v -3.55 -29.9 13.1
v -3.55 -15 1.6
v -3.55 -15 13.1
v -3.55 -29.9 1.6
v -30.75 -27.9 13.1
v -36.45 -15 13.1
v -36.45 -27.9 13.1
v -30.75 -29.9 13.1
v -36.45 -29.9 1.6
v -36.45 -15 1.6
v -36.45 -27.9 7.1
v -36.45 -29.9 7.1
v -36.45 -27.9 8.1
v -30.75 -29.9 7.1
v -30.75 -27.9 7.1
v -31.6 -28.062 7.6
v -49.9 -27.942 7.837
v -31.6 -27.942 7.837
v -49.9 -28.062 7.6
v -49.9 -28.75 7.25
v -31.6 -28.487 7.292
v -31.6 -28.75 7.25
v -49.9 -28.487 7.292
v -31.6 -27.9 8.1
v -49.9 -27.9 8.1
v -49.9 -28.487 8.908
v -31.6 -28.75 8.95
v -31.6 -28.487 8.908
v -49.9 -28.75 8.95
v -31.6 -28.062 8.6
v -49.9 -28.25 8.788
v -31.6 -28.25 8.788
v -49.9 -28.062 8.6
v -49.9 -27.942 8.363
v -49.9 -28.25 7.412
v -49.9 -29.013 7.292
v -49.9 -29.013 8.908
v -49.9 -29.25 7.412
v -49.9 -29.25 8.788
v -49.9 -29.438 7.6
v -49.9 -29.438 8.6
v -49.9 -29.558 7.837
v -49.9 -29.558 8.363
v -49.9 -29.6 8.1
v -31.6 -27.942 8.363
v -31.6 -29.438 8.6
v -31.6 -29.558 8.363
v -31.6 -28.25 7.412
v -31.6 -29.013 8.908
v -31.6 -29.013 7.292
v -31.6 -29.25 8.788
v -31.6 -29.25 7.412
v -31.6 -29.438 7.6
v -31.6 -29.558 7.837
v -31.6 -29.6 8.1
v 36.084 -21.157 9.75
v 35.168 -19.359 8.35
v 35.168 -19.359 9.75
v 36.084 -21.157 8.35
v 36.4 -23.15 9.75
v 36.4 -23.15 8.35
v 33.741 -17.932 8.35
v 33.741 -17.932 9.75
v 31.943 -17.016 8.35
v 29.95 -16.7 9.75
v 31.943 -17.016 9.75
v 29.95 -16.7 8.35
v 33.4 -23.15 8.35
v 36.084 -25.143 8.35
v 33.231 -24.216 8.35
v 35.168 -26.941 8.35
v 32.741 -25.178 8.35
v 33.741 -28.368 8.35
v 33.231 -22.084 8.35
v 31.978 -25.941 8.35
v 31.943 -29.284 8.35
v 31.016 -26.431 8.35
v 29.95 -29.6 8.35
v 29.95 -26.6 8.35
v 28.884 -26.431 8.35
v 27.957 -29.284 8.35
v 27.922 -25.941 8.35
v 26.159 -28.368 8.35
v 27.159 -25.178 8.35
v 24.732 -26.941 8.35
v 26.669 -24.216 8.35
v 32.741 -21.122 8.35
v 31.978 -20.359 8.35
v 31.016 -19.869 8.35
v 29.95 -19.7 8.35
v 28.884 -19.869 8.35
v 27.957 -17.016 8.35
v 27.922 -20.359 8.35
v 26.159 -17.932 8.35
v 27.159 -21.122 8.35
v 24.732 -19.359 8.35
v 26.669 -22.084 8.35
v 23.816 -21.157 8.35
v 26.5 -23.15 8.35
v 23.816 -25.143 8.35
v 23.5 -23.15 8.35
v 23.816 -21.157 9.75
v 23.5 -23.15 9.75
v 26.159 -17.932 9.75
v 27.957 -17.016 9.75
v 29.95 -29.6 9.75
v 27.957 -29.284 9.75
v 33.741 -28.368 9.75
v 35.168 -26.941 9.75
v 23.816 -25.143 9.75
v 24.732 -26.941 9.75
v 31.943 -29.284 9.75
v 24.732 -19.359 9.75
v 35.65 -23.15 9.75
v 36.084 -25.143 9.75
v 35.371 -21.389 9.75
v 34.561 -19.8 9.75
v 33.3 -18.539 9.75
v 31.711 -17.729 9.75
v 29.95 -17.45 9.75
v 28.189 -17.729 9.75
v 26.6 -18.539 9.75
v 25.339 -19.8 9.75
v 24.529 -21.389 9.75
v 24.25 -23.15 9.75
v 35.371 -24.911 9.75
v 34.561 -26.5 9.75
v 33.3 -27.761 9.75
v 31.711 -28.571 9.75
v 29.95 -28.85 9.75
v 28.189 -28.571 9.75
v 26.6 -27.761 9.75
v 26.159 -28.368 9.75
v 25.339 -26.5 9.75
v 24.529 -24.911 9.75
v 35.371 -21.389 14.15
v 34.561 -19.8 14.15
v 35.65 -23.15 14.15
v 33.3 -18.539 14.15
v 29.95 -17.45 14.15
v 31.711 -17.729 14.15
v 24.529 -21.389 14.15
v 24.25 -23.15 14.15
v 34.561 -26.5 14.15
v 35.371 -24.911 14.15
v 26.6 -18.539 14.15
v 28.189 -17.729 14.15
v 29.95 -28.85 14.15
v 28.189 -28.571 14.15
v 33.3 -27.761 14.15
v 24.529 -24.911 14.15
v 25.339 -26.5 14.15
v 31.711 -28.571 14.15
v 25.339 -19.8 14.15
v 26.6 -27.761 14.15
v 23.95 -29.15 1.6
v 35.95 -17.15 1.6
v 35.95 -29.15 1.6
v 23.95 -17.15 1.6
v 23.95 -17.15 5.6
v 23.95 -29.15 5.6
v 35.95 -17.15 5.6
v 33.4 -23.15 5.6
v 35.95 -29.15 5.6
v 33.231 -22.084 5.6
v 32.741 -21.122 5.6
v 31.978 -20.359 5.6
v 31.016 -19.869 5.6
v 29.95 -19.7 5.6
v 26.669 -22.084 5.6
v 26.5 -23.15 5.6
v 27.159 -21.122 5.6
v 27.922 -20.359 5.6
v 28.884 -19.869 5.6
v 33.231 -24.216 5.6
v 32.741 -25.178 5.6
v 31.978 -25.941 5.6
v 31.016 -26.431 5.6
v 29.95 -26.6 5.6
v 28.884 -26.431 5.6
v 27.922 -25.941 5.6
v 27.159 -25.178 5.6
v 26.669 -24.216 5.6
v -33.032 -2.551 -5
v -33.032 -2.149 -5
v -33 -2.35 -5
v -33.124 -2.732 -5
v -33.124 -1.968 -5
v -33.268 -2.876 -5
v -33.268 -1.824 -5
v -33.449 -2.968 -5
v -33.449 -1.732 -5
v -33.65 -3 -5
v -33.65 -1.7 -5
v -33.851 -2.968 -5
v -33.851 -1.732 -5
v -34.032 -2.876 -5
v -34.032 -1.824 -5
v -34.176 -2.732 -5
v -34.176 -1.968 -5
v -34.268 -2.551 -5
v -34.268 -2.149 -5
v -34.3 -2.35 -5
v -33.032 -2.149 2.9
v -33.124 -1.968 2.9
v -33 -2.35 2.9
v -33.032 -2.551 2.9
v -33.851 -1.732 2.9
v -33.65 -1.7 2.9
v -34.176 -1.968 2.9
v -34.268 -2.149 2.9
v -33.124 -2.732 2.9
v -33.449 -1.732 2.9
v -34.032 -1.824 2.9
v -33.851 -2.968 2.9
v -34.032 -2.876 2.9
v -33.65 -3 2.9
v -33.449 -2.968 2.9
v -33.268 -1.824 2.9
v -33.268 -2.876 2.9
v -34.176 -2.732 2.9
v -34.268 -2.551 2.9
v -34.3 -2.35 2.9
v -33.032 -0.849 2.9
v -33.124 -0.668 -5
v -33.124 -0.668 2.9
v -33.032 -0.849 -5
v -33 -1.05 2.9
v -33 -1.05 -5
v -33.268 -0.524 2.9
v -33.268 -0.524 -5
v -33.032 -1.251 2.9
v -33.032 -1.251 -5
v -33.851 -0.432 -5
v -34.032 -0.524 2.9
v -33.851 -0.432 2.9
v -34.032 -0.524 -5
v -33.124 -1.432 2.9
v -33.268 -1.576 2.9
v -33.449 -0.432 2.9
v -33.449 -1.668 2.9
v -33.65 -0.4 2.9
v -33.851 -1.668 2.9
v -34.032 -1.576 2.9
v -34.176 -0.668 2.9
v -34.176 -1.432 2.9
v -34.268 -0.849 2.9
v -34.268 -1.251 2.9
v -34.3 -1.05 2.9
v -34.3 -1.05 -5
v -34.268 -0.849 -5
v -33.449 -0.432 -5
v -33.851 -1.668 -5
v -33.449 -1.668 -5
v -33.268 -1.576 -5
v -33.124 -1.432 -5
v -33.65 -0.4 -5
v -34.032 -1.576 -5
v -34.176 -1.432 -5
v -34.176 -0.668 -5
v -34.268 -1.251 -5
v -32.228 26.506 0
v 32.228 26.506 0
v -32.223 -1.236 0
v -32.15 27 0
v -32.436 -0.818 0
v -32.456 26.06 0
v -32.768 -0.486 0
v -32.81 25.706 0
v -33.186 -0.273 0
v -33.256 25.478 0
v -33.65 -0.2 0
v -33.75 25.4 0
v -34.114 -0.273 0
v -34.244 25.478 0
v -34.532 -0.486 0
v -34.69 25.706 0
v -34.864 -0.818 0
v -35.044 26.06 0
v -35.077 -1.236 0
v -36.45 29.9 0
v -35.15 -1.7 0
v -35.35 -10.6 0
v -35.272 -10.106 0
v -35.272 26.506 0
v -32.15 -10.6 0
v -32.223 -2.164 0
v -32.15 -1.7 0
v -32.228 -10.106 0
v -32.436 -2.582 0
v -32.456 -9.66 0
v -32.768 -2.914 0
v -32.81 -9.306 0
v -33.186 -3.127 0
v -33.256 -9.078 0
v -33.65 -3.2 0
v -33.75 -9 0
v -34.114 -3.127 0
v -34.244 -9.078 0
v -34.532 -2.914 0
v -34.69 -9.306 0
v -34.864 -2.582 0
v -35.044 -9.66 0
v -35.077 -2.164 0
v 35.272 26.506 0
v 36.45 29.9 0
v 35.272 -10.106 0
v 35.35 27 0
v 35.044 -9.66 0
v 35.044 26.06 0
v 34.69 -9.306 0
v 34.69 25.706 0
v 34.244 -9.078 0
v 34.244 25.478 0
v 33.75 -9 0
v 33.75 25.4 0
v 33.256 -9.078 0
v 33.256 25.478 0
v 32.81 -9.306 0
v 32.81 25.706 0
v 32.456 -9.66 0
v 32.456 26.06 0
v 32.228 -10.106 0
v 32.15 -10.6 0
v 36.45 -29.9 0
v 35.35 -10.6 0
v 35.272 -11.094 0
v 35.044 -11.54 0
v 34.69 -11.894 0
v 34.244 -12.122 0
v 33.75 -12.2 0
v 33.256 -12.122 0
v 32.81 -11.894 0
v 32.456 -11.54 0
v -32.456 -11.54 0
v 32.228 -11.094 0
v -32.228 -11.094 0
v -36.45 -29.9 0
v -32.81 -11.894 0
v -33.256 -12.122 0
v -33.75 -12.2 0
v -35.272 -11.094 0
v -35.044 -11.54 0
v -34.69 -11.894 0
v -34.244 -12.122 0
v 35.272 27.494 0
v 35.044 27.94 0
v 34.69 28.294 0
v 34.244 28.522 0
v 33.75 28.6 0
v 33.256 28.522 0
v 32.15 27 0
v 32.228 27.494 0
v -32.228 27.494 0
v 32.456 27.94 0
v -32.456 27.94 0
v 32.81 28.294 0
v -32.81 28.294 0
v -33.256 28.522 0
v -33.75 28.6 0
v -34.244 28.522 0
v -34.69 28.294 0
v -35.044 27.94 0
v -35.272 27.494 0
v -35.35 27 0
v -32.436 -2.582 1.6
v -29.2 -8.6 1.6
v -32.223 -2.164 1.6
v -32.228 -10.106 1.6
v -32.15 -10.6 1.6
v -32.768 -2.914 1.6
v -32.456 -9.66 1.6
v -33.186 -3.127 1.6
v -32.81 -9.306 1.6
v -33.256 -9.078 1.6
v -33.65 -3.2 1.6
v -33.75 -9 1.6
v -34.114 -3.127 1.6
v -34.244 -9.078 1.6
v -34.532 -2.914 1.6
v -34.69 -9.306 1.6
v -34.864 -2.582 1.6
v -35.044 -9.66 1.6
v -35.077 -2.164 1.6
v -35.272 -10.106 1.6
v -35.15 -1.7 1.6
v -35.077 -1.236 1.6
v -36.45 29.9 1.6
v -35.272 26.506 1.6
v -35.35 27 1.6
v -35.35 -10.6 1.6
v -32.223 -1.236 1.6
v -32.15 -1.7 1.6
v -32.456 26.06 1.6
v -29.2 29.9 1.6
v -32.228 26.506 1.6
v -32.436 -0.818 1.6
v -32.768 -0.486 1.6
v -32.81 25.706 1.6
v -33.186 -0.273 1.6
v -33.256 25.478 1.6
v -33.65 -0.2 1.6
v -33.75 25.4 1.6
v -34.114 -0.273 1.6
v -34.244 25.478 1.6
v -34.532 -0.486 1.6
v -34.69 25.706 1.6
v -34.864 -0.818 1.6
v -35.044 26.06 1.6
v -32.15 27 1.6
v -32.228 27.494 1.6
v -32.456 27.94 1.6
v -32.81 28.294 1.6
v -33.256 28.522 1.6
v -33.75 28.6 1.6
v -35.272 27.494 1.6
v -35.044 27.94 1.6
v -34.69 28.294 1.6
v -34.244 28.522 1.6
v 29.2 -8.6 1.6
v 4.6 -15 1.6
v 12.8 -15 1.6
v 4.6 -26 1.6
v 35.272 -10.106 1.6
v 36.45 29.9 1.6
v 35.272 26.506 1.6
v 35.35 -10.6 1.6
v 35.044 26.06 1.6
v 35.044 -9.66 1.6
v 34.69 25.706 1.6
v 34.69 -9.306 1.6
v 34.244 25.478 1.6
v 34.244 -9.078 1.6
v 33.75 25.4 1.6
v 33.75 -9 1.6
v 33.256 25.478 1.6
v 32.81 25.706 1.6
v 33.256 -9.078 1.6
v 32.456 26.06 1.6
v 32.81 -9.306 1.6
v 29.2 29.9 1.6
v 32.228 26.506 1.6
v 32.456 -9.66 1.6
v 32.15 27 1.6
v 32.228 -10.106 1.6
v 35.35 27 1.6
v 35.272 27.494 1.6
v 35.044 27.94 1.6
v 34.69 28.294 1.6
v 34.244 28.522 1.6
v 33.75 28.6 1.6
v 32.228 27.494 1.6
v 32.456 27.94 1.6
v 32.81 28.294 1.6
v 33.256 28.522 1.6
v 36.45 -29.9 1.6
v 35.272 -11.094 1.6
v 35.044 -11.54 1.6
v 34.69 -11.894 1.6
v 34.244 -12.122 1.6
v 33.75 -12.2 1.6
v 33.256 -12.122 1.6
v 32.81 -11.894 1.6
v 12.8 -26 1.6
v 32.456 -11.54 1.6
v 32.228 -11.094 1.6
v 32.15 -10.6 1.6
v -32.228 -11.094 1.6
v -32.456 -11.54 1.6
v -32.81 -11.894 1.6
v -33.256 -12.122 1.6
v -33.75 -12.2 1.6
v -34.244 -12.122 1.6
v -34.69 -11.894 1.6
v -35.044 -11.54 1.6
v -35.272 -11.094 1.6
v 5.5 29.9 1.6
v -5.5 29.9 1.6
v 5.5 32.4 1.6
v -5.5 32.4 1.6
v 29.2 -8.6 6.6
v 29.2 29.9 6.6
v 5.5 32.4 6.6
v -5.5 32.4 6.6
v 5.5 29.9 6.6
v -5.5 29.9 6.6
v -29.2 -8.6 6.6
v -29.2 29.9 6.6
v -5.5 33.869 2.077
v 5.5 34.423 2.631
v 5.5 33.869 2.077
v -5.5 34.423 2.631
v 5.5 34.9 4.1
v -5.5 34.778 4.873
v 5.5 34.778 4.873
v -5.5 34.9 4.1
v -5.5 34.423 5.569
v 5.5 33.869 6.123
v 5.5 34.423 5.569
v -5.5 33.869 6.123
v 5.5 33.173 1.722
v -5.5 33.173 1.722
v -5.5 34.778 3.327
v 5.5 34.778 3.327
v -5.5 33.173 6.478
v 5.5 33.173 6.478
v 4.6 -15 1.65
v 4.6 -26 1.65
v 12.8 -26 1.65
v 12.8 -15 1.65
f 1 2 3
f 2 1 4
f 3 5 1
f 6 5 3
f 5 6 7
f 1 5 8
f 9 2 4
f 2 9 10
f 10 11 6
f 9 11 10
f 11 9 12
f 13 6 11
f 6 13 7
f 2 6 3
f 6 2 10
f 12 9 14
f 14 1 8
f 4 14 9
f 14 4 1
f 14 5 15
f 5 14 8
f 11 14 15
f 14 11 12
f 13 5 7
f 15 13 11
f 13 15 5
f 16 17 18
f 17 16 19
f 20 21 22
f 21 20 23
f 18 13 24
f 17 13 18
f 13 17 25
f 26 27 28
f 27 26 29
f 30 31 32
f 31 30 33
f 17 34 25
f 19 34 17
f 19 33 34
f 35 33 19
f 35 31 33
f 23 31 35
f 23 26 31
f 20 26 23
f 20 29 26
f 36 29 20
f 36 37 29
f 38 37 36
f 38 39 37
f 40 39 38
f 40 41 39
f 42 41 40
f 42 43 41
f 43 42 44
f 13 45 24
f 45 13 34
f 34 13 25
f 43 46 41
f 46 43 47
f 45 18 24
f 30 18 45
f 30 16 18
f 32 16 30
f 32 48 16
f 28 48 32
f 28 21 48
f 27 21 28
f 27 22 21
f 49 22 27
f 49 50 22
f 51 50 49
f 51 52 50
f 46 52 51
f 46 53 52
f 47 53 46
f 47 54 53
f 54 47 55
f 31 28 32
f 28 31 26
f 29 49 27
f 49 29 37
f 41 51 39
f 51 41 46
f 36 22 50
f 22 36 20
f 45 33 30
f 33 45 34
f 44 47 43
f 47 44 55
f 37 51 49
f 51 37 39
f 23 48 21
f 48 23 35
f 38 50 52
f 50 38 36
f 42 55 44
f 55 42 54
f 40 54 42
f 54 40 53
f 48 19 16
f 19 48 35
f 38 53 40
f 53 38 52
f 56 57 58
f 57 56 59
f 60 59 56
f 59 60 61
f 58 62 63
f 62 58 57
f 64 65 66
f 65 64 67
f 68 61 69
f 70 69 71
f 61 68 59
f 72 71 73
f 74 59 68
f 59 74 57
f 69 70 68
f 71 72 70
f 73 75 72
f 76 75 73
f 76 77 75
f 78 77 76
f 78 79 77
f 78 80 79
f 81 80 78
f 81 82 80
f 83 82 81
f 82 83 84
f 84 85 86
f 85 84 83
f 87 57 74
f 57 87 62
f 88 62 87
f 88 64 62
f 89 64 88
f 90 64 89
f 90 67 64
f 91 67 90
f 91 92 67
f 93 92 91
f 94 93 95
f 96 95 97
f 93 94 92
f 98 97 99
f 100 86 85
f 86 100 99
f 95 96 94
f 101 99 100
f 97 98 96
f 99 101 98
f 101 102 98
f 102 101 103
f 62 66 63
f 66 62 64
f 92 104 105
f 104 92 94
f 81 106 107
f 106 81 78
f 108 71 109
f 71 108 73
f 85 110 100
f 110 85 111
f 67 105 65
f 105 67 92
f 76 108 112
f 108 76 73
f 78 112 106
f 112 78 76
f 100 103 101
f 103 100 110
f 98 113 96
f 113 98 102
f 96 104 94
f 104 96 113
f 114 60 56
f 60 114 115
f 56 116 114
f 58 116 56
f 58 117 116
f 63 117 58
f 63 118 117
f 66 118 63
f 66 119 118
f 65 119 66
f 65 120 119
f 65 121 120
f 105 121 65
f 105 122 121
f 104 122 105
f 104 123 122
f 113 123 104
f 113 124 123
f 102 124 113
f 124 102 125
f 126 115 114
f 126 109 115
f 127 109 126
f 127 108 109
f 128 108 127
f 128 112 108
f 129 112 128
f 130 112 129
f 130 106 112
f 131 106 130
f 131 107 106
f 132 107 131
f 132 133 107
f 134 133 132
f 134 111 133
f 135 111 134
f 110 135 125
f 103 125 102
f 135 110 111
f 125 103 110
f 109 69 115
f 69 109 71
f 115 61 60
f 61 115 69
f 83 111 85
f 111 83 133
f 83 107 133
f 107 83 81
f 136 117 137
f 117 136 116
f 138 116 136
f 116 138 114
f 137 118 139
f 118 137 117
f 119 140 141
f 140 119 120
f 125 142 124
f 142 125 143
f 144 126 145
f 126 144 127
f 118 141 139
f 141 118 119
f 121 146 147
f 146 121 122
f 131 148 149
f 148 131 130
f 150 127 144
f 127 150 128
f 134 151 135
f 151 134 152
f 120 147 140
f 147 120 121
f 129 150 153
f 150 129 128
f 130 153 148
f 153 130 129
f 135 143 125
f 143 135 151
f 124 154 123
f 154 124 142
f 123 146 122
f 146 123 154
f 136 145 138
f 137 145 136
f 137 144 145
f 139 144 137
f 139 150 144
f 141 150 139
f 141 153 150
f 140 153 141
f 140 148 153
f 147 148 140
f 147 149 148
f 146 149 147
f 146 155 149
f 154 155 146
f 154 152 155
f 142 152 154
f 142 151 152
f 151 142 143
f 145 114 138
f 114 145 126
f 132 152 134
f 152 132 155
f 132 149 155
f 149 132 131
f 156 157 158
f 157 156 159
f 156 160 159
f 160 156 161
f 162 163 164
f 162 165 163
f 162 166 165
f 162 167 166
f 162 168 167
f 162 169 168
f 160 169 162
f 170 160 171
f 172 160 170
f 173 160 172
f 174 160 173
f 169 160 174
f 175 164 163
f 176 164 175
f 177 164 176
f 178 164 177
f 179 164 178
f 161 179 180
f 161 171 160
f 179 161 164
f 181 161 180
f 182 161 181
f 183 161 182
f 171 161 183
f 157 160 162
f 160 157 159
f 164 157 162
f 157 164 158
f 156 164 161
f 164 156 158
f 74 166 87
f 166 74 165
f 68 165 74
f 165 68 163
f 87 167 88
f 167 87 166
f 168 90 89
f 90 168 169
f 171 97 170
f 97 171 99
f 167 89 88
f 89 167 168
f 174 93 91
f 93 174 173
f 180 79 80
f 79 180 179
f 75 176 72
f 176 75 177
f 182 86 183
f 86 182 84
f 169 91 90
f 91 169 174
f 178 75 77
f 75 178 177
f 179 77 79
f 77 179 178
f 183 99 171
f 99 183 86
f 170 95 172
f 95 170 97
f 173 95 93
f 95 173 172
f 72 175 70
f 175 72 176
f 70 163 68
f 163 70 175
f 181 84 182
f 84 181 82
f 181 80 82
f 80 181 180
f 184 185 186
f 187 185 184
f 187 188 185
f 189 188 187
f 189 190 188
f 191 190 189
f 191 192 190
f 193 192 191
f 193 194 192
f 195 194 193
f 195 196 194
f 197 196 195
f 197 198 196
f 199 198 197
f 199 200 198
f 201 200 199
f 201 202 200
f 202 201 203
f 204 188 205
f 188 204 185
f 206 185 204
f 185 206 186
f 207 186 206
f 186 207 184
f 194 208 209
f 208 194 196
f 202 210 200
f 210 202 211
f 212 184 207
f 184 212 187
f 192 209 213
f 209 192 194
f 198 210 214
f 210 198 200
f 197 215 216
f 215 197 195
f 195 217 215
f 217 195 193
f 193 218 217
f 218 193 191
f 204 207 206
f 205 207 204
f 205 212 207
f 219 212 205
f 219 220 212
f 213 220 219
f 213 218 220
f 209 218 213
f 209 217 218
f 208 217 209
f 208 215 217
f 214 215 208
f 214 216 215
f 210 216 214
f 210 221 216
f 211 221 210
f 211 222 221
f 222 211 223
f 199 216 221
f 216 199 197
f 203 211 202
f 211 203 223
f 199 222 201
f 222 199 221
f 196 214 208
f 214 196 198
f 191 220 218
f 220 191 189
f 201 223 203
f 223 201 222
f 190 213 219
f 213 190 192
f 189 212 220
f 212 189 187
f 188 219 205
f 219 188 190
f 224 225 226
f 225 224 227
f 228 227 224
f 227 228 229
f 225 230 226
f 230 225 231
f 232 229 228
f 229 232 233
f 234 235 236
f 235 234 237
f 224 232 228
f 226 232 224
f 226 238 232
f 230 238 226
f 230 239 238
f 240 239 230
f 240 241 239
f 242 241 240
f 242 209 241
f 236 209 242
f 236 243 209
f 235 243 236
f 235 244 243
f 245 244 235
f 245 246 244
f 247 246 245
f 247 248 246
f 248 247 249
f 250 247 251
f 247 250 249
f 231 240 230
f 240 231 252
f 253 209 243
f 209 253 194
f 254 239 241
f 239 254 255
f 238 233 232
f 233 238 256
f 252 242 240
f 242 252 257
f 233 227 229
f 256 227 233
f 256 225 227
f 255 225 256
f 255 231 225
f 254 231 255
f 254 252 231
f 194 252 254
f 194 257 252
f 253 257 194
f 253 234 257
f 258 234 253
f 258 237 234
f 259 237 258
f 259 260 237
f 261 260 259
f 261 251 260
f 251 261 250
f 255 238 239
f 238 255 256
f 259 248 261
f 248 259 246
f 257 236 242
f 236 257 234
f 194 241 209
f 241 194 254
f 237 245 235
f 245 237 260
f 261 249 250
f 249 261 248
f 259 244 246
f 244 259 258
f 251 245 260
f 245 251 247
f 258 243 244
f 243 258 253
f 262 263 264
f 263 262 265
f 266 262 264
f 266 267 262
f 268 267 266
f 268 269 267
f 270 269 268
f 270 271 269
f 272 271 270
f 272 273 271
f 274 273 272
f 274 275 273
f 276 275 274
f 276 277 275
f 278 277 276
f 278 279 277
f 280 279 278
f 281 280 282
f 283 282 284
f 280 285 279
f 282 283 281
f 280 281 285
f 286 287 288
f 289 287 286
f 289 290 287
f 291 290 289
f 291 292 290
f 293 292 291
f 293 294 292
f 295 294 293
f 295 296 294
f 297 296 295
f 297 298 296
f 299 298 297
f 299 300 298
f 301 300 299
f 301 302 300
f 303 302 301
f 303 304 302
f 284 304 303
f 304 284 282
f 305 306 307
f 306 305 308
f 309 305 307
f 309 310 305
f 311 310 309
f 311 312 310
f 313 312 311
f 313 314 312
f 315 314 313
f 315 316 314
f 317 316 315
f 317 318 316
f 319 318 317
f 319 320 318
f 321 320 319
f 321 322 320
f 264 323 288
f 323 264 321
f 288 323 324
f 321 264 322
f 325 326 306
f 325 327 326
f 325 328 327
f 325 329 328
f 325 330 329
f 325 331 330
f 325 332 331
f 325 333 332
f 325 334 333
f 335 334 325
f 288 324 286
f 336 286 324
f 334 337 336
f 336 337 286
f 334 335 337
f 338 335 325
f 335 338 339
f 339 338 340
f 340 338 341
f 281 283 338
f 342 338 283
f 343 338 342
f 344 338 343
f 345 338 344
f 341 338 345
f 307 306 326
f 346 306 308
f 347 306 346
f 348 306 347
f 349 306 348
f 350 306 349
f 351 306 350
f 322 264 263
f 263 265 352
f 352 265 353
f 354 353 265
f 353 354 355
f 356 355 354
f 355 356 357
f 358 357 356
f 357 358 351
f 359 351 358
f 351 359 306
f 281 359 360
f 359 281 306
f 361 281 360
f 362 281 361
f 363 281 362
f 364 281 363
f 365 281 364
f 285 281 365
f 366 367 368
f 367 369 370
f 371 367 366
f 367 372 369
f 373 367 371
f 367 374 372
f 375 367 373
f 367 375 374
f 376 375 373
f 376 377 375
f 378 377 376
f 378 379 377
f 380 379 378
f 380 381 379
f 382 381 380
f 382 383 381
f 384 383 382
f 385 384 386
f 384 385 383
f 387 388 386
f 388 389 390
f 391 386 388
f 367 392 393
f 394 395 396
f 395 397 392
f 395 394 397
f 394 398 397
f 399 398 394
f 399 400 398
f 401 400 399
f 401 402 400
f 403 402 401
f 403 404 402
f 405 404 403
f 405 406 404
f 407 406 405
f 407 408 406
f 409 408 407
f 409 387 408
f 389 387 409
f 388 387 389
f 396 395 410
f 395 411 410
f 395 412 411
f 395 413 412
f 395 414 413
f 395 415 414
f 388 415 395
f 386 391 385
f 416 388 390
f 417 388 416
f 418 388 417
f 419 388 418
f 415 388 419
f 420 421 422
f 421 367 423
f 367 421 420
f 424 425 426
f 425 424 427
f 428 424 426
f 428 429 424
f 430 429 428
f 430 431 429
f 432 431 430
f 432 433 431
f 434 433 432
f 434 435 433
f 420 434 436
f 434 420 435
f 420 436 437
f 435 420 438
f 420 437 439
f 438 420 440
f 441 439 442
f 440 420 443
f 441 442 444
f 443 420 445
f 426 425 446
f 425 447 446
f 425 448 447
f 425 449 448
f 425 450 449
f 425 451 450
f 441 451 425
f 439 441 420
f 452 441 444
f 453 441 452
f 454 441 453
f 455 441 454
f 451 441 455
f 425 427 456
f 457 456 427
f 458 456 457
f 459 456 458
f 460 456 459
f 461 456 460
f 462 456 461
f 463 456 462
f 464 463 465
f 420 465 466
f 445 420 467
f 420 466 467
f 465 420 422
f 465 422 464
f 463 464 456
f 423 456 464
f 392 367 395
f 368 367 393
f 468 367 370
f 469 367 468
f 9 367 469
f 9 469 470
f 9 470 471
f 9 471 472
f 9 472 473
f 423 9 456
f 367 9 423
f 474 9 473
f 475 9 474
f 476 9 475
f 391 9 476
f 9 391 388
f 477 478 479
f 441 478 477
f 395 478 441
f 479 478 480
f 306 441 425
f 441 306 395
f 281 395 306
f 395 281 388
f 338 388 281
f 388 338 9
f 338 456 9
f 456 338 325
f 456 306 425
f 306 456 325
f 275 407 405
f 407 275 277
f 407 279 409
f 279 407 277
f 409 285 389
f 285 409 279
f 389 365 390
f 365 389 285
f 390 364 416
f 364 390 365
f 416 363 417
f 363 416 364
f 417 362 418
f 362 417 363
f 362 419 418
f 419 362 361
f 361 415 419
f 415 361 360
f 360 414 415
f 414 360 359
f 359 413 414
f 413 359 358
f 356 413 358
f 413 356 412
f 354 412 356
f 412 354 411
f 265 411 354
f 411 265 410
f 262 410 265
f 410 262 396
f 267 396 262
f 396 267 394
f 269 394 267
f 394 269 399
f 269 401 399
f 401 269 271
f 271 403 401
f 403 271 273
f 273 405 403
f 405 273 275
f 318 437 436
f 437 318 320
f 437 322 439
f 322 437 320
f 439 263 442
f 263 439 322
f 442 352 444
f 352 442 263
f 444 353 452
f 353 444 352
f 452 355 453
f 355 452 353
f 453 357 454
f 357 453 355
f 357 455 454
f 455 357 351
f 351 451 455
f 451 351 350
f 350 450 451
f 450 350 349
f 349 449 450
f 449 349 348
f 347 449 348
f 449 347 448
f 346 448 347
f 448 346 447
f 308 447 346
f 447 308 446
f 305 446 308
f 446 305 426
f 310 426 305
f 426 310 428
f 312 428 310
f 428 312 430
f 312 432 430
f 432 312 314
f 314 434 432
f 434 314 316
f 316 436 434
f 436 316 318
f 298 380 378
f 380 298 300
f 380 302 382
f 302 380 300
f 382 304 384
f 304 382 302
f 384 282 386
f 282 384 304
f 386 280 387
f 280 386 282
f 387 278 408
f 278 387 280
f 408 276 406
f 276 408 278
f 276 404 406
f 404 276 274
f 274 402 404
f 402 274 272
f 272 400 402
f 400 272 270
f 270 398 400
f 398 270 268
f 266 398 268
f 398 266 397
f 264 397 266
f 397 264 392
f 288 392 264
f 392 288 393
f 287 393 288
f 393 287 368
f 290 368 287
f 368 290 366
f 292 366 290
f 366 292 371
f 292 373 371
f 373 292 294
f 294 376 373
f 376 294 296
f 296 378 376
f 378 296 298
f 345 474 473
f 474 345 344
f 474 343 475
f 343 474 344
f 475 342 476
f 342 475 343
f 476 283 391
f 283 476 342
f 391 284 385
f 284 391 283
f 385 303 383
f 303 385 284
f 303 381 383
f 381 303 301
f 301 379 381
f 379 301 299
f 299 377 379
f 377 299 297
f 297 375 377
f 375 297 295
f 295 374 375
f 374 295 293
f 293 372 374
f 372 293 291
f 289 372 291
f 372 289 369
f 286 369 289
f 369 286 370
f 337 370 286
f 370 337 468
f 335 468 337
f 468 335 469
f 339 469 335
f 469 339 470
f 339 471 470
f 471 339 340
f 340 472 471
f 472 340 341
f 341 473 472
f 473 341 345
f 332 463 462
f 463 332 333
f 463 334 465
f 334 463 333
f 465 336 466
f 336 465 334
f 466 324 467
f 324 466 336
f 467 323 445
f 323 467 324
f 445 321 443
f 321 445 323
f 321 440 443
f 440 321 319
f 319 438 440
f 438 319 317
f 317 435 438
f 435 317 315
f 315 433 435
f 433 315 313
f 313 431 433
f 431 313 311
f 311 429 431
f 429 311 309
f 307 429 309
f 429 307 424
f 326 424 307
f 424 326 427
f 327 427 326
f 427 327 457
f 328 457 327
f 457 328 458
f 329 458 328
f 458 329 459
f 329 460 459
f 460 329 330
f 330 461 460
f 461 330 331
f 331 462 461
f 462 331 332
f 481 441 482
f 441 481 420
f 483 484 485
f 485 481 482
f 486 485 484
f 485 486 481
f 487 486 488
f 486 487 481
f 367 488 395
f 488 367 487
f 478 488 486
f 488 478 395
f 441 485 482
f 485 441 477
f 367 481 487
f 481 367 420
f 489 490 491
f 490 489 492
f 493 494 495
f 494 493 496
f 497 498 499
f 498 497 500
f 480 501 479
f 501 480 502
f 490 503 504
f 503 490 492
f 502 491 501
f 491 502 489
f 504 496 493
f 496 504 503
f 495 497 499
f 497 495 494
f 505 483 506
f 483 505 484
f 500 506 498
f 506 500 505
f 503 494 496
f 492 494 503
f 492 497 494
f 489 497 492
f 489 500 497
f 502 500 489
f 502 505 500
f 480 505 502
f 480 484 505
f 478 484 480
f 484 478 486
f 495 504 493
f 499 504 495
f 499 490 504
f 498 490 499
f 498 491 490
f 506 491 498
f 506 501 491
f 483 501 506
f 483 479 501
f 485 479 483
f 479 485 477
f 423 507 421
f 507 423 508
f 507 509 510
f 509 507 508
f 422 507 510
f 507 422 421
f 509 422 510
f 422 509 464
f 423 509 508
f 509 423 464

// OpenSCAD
// new parametric housing for LCR meter
$fn=20;
fudge=0.1;

//Dimensions
pcbDims=[72.9,59.8,1.6];
holeDia=3.2;
holeDist=[67.5,37.6];
holeOffset=[0,-holeDia/2+(pcbDims.y-holeDist.y)/2-1.3];//1.3+3.2/2
wirePos=[-pcbDims.x/2+2.8,pcbDims.y/2-31.6,0]; //31.6 from top on left side 2.8
wireDia=1.3;
wireLen=5;
displayDims=[58.4,38.5,5];
displayPos=[0,(pcbDims.y-displayDims.y)/2,pcbDims.z+displayDims.z/2]; //centered on the top
socketDims=[32.9,14.9,11.5];
socketPos=[-(pcbDims.x-socketDims.x)/2,-(pcbDims.y-socketDims.y)/2,pcbDims.z]; //lower left corner
btnPos=[(pcbDims.x-13)/2,-(pcbDims.y-13.5)/2,pcbDims.z];;//lower right corner
padsDims=[8.2,11,0.05];
padsPos=[pcbDims.x/2-27.75,-pcbDims.y/2+14.9-padsDims.y/2,pcbDims.z];
  


LCRmeter();

module LCRmeter(){
 
  //pcb
  color("orange") linear_extrude(pcbDims.z) difference(){
    square([pcbDims.x,pcbDims.y],true);
    for (ix=[-1,1],iy=[-1,1])
      translate([ix*holeDist.x/2+holeOffset.x,iy*holeDist.y/2+holeOffset.y]) circle(d=holeDia);
    translate(wirePos) circle(d=3);
  }
  
  //display
  color("white") translate(displayPos) cube(displayDims,true);
  
  //display Flex
  translate([displayPos.x,pcbDims.y/2+displayDims.z/2,displayPos.z])
    rotate([0,90,0]) cylinder(d=displayDims.z ,h=11,center=true);
  translate([displayPos.x,pcbDims.y/2+displayDims.z/4,displayPos.z]) 
    cube([11,displayDims.z/2,displayDims.z],true);
  
  //socket
  translate(socketPos) socket();
  
  //button
  translate(btnPos) button();
  
  //pads
  color("silver") translate(padsPos) linear_extrude(padsDims.z) square([padsDims.x,padsDims.y],true);
  
  //battery wires
  for (ix=[-1,1])
    translate(wirePos+[0,ix*wireDia/2,-wireLen]) cylinder(d=wireDia,h=wireLen+pcbDims.z+wireDia);
  
  module button(){
    color("#222222") linear_extrude(4) square(12,true);
    //stem
    color("grey") cylinder(d=6.9,h=6.75);
    //cap
    translate([0,0,6.75]) color("blue"){
      cylinder(d=12.9,h=1.4);
      cylinder(d=11.4,h=5.8);
      }
  }
  
  module socket(closed=true){
    //body
    rot = closed ? -90 : 0;
    translate([-socketDims.x/2,-socketDims.y/2,0]){
      color("lightblue") difference(){
        cube(socketDims);
        translate([-fudge,-fudge,socketDims.z-6]) cube([5.7+fudge,2+fudge,6+fudge]);
        }
    //lever
    translate([5.7-1.7/2,2-1.7/2,6.5]) rotate([0,rot,0]) cylinder(d=1.7,h=18.3);
    }
  }
}
